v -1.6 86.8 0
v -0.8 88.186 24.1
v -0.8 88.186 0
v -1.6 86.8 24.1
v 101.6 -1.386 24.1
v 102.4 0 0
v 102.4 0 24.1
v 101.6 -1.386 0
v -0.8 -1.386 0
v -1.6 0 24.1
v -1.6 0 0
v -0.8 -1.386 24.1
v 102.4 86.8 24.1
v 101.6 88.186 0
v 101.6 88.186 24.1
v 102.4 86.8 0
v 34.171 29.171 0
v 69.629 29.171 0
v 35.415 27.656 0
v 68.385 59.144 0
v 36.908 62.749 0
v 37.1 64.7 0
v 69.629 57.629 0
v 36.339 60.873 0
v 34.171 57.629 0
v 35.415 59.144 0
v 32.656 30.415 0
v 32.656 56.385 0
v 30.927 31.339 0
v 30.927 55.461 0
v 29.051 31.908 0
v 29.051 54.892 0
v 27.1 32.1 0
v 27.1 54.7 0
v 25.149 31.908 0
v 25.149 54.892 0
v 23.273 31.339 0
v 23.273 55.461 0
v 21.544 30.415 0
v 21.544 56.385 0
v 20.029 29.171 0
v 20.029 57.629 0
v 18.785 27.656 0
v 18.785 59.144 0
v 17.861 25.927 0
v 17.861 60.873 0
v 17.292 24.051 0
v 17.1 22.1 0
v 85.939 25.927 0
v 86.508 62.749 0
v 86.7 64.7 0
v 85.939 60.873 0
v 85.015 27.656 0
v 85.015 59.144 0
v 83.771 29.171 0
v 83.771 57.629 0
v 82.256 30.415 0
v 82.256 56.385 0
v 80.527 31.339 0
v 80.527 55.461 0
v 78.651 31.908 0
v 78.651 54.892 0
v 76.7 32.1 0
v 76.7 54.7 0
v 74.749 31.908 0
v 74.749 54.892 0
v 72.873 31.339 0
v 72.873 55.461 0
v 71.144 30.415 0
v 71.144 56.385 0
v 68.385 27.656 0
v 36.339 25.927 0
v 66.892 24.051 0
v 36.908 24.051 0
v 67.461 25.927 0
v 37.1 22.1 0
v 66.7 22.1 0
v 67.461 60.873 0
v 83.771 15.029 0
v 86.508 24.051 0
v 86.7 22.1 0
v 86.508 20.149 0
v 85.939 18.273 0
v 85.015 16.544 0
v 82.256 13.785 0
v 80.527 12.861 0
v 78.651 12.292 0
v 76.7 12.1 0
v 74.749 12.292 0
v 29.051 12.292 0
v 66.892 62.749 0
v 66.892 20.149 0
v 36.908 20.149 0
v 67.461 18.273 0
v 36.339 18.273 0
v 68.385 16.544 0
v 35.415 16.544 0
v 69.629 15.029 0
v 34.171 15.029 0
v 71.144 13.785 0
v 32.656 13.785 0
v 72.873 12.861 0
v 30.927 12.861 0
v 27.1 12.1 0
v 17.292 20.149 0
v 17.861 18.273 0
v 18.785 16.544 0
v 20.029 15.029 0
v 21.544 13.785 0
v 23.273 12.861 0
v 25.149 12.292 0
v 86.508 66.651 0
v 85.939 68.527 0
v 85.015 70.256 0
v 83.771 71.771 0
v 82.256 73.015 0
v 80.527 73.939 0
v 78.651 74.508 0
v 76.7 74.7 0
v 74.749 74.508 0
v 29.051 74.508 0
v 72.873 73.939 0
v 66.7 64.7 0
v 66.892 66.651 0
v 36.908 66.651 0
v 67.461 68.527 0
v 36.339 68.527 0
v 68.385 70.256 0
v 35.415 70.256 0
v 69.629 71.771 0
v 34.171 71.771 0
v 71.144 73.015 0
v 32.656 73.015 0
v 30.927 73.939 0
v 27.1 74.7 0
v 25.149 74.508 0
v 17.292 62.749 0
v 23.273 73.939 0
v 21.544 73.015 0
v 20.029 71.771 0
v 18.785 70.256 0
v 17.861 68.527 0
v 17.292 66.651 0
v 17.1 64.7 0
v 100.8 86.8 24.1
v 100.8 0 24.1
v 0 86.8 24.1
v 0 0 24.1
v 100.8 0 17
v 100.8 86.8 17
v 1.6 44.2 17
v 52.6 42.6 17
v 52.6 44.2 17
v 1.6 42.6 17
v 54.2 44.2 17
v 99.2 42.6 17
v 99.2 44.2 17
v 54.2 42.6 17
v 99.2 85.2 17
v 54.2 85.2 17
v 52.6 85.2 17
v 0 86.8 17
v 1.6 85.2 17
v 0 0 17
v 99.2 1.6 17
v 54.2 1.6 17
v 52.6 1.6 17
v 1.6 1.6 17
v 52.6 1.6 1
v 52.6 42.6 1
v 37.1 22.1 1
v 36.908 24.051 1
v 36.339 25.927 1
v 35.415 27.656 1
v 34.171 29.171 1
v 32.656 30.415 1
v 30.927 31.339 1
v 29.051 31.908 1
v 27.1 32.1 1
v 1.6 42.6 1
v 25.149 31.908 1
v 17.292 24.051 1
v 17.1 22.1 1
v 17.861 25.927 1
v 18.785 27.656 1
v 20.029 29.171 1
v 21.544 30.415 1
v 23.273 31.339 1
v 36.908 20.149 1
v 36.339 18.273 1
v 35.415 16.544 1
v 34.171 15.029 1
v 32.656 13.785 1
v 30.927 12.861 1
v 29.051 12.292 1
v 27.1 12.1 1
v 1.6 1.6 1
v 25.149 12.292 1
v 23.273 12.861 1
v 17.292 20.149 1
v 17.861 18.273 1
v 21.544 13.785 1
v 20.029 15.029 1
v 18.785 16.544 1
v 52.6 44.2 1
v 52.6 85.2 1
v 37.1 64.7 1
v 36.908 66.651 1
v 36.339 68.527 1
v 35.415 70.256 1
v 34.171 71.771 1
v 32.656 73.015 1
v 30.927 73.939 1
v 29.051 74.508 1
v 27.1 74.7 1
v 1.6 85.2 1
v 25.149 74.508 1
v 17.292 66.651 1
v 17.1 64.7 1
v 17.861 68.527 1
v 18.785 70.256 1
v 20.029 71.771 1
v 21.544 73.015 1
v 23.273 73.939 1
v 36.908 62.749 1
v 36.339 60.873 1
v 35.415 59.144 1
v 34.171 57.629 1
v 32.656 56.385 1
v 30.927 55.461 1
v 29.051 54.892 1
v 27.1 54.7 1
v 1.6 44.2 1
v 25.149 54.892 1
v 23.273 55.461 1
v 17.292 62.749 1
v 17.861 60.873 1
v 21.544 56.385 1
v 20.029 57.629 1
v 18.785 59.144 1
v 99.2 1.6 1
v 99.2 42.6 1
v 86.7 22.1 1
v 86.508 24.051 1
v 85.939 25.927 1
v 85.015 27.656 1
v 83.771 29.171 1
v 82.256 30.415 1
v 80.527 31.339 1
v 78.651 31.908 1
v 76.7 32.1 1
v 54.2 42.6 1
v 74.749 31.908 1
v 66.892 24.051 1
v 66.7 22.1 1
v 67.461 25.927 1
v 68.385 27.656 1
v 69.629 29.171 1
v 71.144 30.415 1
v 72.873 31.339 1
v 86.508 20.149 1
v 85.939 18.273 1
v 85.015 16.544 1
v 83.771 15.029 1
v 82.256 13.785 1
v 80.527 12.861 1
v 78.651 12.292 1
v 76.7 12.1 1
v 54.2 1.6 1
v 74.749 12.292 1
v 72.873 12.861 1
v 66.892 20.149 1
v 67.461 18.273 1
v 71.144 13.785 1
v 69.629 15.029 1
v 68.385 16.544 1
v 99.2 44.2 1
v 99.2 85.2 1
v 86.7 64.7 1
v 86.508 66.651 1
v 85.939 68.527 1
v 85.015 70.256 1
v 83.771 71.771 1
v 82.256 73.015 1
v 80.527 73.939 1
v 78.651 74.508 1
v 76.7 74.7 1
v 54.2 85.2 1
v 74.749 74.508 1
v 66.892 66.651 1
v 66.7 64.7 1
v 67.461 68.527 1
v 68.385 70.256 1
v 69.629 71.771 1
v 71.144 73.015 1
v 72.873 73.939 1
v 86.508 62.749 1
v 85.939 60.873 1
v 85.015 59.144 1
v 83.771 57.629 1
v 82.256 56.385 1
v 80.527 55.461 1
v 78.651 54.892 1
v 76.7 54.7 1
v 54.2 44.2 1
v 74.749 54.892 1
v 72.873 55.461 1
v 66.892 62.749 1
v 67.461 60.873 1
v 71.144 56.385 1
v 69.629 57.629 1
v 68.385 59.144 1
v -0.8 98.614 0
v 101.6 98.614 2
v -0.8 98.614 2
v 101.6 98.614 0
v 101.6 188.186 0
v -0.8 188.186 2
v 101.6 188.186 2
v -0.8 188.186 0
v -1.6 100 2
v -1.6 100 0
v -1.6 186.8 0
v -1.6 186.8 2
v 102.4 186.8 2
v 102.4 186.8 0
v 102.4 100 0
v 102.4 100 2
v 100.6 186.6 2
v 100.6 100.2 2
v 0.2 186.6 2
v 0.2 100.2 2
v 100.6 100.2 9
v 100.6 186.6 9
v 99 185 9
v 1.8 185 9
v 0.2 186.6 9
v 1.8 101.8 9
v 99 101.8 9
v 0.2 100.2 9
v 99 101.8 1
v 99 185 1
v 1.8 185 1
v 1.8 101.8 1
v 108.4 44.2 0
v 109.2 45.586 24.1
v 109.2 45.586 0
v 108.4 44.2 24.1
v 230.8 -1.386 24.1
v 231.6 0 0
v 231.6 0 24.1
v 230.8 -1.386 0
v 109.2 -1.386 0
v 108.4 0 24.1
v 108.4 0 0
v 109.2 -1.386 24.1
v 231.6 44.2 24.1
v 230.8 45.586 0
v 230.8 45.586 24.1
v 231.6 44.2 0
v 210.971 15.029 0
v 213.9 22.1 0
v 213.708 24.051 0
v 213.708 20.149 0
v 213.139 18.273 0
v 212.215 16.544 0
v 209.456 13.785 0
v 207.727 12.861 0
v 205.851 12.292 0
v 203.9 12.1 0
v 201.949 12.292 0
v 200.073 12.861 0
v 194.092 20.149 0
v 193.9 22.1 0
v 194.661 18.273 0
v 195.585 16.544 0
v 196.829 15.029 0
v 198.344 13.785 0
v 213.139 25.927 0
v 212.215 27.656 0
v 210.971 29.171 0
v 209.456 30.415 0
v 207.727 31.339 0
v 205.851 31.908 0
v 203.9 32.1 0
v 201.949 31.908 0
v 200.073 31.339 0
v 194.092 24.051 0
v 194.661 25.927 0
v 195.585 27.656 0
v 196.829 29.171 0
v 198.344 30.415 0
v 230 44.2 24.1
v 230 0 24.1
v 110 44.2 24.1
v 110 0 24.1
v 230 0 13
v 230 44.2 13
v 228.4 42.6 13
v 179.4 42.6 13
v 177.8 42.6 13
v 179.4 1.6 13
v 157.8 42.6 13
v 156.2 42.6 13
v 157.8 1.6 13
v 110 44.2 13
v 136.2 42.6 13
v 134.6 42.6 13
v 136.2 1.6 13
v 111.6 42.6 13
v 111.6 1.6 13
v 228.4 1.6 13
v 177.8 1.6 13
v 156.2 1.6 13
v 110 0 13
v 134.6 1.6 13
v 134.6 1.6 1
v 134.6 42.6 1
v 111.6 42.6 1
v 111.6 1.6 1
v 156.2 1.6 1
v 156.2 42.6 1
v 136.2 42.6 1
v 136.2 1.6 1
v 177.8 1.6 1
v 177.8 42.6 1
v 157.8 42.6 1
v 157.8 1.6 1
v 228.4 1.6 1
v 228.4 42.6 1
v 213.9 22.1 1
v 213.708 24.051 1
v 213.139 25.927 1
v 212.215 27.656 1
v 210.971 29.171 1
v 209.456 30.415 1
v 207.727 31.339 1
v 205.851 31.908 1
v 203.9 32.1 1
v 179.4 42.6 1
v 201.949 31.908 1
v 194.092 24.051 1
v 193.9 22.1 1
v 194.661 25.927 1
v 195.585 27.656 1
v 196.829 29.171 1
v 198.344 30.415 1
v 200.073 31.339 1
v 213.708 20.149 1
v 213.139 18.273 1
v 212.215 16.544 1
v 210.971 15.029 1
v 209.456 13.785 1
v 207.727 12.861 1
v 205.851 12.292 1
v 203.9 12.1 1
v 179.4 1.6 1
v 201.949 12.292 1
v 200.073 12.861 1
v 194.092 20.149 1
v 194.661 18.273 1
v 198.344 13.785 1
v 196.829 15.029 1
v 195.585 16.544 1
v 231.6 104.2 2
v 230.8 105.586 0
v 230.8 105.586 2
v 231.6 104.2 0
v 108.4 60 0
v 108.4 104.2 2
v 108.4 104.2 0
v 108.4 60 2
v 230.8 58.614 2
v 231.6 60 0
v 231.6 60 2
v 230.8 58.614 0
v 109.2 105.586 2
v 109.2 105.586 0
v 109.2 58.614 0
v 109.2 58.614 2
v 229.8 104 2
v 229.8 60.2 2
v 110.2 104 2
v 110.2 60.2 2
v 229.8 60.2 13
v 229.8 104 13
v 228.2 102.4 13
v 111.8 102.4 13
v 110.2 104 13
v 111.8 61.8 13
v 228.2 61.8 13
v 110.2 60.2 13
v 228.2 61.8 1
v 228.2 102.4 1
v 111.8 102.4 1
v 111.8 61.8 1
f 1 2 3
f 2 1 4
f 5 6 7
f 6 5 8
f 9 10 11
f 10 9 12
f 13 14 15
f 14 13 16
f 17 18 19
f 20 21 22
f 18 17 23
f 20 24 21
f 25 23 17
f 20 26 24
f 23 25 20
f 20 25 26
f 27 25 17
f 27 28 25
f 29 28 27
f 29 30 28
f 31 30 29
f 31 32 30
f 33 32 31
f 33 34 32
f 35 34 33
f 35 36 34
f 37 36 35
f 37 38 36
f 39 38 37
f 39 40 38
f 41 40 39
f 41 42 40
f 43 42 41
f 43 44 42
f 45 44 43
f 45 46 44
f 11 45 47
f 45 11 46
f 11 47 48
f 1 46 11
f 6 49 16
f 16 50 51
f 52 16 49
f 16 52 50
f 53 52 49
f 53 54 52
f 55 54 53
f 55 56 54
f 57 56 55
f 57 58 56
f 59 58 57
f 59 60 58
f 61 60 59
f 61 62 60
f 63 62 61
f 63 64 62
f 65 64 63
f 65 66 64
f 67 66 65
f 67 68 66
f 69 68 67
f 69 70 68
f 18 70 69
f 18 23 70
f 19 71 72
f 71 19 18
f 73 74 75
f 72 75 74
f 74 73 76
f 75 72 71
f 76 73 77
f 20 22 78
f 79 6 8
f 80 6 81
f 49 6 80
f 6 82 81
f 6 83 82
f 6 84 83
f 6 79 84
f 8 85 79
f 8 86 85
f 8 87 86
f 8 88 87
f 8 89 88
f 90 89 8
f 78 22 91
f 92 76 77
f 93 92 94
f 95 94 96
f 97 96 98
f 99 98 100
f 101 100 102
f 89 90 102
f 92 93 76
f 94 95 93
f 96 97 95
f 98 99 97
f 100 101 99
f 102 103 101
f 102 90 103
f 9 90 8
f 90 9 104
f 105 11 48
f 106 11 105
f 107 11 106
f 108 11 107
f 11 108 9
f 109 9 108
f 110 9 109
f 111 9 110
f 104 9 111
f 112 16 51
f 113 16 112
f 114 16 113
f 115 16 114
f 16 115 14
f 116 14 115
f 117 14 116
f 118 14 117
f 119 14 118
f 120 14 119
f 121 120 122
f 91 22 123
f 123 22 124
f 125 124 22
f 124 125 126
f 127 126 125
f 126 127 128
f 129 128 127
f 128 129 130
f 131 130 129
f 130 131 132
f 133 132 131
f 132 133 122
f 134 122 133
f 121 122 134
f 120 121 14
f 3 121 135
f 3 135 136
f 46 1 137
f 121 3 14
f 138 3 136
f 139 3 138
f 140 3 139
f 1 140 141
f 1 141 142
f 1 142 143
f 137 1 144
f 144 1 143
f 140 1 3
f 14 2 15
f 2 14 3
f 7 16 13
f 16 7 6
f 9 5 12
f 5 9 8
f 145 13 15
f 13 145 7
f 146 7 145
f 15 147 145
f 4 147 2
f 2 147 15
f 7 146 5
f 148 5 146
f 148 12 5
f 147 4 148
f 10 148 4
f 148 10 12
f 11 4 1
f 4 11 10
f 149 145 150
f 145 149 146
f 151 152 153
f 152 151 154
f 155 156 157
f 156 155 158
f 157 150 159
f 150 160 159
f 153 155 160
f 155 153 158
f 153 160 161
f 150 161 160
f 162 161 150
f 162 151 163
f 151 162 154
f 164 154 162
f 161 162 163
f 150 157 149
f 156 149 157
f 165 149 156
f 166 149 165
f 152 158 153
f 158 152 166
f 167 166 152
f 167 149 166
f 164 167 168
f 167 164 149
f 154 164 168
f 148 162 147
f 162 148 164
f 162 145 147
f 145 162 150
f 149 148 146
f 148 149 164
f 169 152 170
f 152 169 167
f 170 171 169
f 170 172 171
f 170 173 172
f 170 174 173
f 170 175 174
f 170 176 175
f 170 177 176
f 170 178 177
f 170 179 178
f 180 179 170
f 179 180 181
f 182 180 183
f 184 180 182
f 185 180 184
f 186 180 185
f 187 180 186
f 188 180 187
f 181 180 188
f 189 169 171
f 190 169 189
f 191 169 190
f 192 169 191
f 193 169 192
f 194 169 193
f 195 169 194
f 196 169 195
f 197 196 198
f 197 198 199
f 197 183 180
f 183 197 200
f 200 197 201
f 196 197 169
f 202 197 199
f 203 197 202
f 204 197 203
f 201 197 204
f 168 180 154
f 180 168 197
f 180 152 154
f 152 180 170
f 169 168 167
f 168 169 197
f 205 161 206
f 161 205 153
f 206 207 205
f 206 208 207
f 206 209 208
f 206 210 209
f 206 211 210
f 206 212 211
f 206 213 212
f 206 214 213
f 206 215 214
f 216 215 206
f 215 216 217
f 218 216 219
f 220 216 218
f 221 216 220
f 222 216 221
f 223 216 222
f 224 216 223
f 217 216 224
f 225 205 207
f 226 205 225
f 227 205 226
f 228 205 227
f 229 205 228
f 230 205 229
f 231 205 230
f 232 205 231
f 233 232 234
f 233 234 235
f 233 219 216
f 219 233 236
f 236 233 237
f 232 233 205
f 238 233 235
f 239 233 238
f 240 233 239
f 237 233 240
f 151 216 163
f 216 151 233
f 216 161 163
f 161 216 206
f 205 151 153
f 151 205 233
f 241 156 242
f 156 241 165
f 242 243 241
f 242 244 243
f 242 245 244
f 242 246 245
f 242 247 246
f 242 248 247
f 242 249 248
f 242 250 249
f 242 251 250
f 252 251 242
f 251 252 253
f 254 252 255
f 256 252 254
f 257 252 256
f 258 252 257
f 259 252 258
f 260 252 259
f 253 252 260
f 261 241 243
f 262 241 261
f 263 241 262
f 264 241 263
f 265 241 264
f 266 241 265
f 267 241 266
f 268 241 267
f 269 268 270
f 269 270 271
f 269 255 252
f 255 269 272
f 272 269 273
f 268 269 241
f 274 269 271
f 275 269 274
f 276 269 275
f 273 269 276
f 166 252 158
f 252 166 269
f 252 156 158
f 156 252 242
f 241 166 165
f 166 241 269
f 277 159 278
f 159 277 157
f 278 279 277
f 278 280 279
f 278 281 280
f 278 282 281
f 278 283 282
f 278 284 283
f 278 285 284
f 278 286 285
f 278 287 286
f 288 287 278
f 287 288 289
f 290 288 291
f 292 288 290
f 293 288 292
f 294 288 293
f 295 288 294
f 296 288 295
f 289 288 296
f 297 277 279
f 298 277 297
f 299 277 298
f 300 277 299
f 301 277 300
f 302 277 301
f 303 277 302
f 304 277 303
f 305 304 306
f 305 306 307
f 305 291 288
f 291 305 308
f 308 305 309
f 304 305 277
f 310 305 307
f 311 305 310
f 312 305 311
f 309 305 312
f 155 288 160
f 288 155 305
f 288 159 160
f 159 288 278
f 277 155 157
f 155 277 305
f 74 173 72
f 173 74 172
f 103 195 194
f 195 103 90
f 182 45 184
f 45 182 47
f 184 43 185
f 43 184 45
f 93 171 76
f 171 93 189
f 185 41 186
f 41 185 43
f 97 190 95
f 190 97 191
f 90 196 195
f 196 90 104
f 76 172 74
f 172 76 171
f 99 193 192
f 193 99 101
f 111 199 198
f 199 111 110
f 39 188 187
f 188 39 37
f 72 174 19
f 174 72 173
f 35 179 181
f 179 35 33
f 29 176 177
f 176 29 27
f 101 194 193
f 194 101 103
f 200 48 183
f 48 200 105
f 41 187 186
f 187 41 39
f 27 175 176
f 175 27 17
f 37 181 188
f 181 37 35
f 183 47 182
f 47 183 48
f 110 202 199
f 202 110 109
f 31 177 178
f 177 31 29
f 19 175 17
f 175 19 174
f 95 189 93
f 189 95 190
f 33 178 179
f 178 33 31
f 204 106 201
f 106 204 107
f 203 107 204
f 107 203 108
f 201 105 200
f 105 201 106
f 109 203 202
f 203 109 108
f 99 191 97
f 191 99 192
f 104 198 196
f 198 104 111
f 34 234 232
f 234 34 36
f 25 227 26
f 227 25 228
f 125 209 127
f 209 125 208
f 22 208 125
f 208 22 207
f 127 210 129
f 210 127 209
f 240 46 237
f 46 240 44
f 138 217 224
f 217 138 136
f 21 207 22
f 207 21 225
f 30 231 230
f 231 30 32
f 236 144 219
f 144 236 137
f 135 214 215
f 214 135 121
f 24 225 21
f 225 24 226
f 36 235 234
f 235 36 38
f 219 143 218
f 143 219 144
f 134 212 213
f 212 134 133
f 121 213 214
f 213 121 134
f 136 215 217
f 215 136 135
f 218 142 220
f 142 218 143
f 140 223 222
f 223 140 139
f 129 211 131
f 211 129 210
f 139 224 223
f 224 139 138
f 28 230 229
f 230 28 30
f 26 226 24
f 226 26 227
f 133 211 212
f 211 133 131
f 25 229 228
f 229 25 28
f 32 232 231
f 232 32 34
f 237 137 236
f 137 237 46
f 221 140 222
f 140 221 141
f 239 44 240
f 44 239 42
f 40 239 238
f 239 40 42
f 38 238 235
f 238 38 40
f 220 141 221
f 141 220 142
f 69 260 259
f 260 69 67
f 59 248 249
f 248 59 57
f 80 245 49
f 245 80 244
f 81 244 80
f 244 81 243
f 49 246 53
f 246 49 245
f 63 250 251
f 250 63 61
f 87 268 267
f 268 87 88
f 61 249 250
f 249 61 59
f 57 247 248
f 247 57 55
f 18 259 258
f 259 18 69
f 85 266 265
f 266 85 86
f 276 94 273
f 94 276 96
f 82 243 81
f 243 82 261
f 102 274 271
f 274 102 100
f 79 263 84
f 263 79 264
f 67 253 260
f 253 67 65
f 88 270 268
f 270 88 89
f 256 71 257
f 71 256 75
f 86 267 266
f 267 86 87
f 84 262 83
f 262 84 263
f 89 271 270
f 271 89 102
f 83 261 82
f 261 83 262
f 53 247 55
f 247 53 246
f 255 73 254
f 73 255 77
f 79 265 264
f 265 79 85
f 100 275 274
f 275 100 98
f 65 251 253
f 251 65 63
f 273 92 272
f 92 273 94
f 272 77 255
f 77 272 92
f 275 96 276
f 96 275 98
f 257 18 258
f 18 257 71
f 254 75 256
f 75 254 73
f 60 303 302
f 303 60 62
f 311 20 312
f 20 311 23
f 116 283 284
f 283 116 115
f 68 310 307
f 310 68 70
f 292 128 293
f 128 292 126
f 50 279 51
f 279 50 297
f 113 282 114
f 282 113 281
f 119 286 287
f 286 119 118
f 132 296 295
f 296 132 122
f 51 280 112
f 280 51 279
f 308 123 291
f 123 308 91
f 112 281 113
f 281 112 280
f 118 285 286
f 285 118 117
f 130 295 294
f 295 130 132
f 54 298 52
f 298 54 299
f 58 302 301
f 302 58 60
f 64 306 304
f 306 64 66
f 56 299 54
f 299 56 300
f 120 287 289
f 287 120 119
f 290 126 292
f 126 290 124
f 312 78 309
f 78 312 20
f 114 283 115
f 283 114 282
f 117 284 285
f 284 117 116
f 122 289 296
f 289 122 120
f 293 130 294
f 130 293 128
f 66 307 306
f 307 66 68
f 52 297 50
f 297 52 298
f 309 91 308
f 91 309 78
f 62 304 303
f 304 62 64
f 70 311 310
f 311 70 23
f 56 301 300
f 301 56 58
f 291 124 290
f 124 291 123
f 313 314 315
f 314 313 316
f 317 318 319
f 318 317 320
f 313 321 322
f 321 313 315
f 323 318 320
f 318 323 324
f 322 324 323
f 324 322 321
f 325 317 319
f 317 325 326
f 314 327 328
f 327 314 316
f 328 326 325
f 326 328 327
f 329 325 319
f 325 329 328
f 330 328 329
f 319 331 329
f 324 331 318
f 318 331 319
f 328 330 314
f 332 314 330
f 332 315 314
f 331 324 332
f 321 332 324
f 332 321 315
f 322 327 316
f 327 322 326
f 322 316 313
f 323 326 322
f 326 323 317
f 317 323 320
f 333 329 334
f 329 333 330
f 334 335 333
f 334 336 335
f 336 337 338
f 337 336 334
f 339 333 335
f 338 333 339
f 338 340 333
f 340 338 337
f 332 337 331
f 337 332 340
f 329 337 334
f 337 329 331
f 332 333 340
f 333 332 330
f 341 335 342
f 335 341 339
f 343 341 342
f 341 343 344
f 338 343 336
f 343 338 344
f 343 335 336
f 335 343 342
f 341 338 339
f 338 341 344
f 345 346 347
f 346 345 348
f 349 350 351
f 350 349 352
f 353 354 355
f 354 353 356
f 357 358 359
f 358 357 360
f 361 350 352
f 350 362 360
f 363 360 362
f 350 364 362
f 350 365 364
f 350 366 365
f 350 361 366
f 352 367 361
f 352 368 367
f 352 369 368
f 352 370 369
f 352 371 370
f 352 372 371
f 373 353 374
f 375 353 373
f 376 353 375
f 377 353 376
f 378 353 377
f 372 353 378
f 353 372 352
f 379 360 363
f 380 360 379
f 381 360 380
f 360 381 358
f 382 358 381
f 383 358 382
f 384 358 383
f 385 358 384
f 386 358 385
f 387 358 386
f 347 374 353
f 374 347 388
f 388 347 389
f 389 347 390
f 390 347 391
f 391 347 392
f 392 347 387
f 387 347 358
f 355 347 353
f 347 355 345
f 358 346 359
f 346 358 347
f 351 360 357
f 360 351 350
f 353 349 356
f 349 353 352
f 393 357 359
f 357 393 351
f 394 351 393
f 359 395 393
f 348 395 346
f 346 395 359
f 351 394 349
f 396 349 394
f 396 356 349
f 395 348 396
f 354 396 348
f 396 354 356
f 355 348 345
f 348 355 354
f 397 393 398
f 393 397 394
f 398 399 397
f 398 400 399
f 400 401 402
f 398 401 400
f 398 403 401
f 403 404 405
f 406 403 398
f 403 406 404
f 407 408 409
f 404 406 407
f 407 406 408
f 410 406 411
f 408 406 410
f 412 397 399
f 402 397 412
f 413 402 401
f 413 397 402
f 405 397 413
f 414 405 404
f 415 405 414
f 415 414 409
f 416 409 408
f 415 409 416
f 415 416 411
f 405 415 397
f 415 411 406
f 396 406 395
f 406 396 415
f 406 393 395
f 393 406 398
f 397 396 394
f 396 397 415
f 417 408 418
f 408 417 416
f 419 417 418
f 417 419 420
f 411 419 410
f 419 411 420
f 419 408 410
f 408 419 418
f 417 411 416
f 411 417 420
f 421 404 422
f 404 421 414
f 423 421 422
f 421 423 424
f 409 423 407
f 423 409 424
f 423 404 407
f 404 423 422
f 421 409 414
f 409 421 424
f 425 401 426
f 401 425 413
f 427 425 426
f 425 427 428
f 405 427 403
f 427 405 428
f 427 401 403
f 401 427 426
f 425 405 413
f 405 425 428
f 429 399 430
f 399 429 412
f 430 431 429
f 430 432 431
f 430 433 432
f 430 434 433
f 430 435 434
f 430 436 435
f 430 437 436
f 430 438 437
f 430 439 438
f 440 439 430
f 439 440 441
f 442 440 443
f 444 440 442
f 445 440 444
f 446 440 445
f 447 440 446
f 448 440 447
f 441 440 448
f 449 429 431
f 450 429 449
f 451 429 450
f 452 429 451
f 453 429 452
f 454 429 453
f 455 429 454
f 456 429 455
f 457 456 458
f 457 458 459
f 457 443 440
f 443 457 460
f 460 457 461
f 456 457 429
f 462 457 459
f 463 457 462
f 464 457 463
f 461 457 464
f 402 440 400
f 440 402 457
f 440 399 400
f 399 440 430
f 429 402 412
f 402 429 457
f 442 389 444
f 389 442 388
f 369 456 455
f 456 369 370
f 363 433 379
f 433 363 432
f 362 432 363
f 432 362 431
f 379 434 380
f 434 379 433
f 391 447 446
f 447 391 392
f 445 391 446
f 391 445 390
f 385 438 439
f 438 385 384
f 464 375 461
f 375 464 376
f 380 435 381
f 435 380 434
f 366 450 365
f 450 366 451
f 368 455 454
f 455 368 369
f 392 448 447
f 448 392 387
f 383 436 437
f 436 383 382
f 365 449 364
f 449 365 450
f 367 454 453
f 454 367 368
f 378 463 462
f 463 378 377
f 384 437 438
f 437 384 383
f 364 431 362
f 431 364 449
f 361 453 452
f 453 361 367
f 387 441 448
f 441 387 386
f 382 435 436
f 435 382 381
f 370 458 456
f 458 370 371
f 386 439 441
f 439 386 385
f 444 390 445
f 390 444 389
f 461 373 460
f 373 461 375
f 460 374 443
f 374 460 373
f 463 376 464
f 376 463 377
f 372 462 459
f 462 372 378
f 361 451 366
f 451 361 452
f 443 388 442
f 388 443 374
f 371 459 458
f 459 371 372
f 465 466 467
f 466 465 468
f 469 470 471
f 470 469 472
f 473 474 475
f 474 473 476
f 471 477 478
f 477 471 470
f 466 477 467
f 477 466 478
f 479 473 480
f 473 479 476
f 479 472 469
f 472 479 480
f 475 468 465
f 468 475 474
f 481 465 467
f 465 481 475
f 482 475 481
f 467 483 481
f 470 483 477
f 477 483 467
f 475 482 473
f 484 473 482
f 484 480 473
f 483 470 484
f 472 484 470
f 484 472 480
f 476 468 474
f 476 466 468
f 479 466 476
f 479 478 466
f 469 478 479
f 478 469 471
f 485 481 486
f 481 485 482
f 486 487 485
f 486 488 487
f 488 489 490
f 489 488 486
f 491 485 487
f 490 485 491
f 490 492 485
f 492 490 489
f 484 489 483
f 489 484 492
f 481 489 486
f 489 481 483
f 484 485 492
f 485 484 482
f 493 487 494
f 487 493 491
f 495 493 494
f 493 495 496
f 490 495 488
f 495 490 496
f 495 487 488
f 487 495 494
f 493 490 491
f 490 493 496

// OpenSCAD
// Puerto Rico Anniversary Edition
//
// by W. Craig Trader is dual-licensed under 
// Creative Commons Attribution-ShareAlike 3.0 Unported License and
// GNU Lesser GPL 3.0 or later.

include <MCAD/units.scad>;

// Command Line Arguments
PART = "other";           // Which part to output
VERBOSE = 1;        // Set to non-zero to see more data

// Physical dimensions
WALL = 0.8 * mm; // Slicing filament thickness
GAP  = 0.2 * mm; // Size differential between box and lid, for snug fit
POKE_HOLE = 20 * mm; // Diameter of poke holes in bottom
BOTTOM = 1 * mm;

// Tile dimensions
BASIC_THICKNESS = 7/128 * inch;
DELUXE_THICKNESS = 1/8 * inch;
TILE_WIDTH = (1 + 37/64) * inch;
SMALL_TILE_HEIGHT = 29/32 * inch;
LARGE_TILE_HEIGHT = (1 + 57/64) * inch;

// Wall dimensions
OUTER  = 2 * WALL;
INNER  = 2 * WALL;
SEP    = 2 * WALL;

OVERLAP = 0.1 * mm; // Ensures that there are no vertical artifacts leftover

$fa=4;

module basic_bottom() {
    box_height = ceil( max( SMALL_TILE_HEIGHT/2, 5*BASIC_THICKNESS) );
    lid_height = ceil( SMALL_TILE_HEIGHT ) - box_height;

    s1 = ceil( 16*BASIC_THICKNESS );
    s2 = ceil( 14*BASIC_THICKNESS );
    s3 = ceil( 14*BASIC_THICKNESS );
    s4 = ceil( LARGE_TILE_HEIGHT );

    width = ceil( TILE_WIDTH );
    length = 2*INNER + 3*SEP + s1 + s2 + s3 + s4;
    height = 2*INNER + width;

    echo( Width=width, BasicS1=s1, BasicS2=s2, BasicS3=s3, BasicS4=s4 );
    echo( BasicInsideLength=length, BasicInsideHeight=height );
    echo( BasicOutsideLength=length+2*OUTER, BasicOutsideHeight=height+2*OUTER );

    difference() {
        // Outside of box
        minkowski() {
            cube( [ length, height, box_height+lid_height ] );
            cylinder( r=OUTER, h=OVERLAP );
        }
        
        // Remove upper lip
        translate( [ 0, 0, BOTTOM+box_height ] ) 
            cube( [ length, height, lid_height+OVERLAP ] );
        
        // Remove space for tiles
        translate( [ INNER, INNER, BOTTOM ] ) 
            cube( [ s1, width, box_height+OVERLAP ] );
        translate( [ INNER+s1+SEP, INNER, BOTTOM ] ) 
            cube( [ s2, width, box_height+OVERLAP ] );
        translate( [ INNER+s1+s2+2*SEP, INNER, BOTTOM ] ) 
            cube( [ s3, width, box_height+OVERLAP ] );
        translate( [ INNER+s1+s2+s3+3*SEP, INNER, BOTTOM ] ) 
            cube( [ s4, width, box_height+OVERLAP ] );

        // Remove holes in bottom, for ease in removing tiles and parts
        translate( [ INNER+s1+s2+s3+3*SEP+s4/2, INNER+width/2, -OVERLAP ] ) 
            cylinder( d=POKE_HOLE, h=BOTTOM+2*OVERLAP );
    }
}

module basic_top() {
    box_height = ceil( max( SMALL_TILE_HEIGHT/2, 5*BASIC_THICKNESS) );
    lid_height = ceil( SMALL_TILE_HEIGHT ) - box_height;

    s1 = ceil( 16*BASIC_THICKNESS );
    s2 = ceil( 14*BASIC_THICKNESS );
    s3 = ceil( 14*BASIC_THICKNESS );
    s4 = ceil( LARGE_TILE_HEIGHT );

    width = ceil( TILE_WIDTH );
    length = 2*INNER + 3*SEP + s1 + s2 + s3 + s4;
    height = 2*INNER + width;

    difference() {
        union() {
            minkowski() {
                cube( [ length, height, BOTTOM ] );
                cylinder( r=OUTER, h=BOTTOM );
            }
            translate( [ GAP, GAP, BOTTOM ] ) 
                cube( [ length-2*GAP, height-2*GAP, lid_height ] );
        }
        translate( [ INNER+GAP, INNER+GAP, BOTTOM ] ) 
            cube( [ length-2*INNER-2*GAP, height-2*INNER-2*GAP, lid_height+OVERLAP ] );
    }
}

module deluxe_bottom() {
    box_height = ceil( max( SMALL_TILE_HEIGHT/2, 5*DELUXE_THICKNESS) );
    lid_height = ceil( SMALL_TILE_HEIGHT ) - box_height;

    large = ceil( max( LARGE_TILE_HEIGHT, 16*DELUXE_THICKNESS ) );
    small = ceil( 14*DELUXE_THICKNESS );
    width = ceil( TILE_WIDTH );

    length = 2*INNER + large + SEP + small;
    height = 2*INNER + 2*width + SEP;

    echo( Width=width, DeluxeLarge=large, DeluxeSmall=small );
    echo( DeluxeInsideLength=length, DeluxeInsideHeight=height );
    echo( DeluxeOutsideLength=length+2*OUTER, DeluxeOutsideHeight=height+2*OUTER );

    difference() {
        // Outside of box
        minkowski() {
            cube( [ length, height, box_height+lid_height ] );
            cylinder( r=OUTER, h=OVERLAP );
        }
        
        // Remove upper lip
        translate( [ 0, 0, BOTTOM+box_height ] ) 
            cube( [ length, height, lid_height+OVERLAP ] );
        
        // Remove space for tiles
        translate( [ INNER, INNER, BOTTOM ] ) 
            cube( [ large, width, box_height+OVERLAP ] );
        translate( [ INNER, INNER+width+SEP, BOTTOM ] ) 
            cube( [ large, width, box_height+OVERLAP ] );
        translate( [ INNER+large+SEP, INNER, BOTTOM ] ) 
            cube( [ small, width, box_height+OVERLAP ] );
        translate( [ INNER+large+SEP, INNER+width+SEP, BOTTOM ] ) 
            cube( [ small, width, box_height+OVERLAP ] );
        
        // Remove holes in bottom, for ease in removing tiles and parts
        translate( [ INNER+large/2, INNER+width/2, -OVERLAP ] ) 
            cylinder( d=POKE_HOLE, h=BOTTOM+2*OVERLAP );
        translate( [ INNER+large/2, INNER+width+SEP+width/2, -OVERLAP ] ) 
            cylinder( d=POKE_HOLE, h=BOTTOM+2*OVERLAP );
        translate( [ INNER+large+SEP+small/2, INNER+width/2, -OVERLAP ] ) 
            cylinder( d=POKE_HOLE, h=BOTTOM+2*OVERLAP );
        translate( [ INNER+large+SEP+small/2, INNER+width+SEP+width/2, -OVERLAP ] ) 
            cylinder( d=POKE_HOLE, h=BOTTOM+2*OVERLAP );
    }
}

module deluxe_top() {
    box_height = ceil( max( SMALL_TILE_HEIGHT/2, 5*DELUXE_THICKNESS) );
    lid_height = ceil( SMALL_TILE_HEIGHT ) - box_height;

    large = ceil( max( LARGE_TILE_HEIGHT, 16*DELUXE_THICKNESS ) );
    small = ceil( 14*DELUXE_THICKNESS );
    width = ceil( TILE_WIDTH );

    length = 2*INNER + large + SEP + small;
    height = 2*INNER + 2*width + SEP;

    difference() {
        union() {
            minkowski() {
                cube( [ length, height, BOTTOM ] );
                cylinder( r=OUTER, h=BOTTOM );
            }
            translate( [ GAP, GAP, BOTTOM ] ) 
                cube( [ length-2*GAP, height-2*GAP, lid_height ] );
        }
        translate( [ INNER+GAP, INNER+GAP, BOTTOM ] ) 
            cube( [ length-2*INNER-2*GAP, height-2*INNER-2*GAP, lid_height+OVERLAP ] );
    }
}

if (VERBOSE) {
	echo (Part=PART);
    echo( DELUXE_THICKNESS=DELUXE_THICKNESS, BASIC_THICKNESS=BASIC_THICKNESS );
    echo( TILE_WIDTH=TILE_WIDTH, SMALL_TILE_HEIGHT=SMALL_TILE_HEIGHT, LARGE_TILE_HEIGHT=LARGE_TILE_HEIGHT );
    echo( LARGE=16*DELUXE_THICKNESS, SMALL=14*DELUXE_THICKNESS, WIDTH=TILE_WIDTH );
    echo( 5*DELUXE_THICKNESS, SMALL_TILE_HEIGHT-5*DELUXE_THICKNESS );
}

if (PART == "limited-box") {
    deluxe_bottom();
} else if (PART == "limited-lid") {
    deluxe_top();
} else if (PART == "basic-box") {
    basic_bottom();
} else if (PART == "basic-lid") {
    basic_top();
} else {
    translate( [   0,   0, 0 ] ) deluxe_bottom();
    translate( [   0, 100, 0 ] ) deluxe_top();
    translate( [ 110,   0, 0 ] ) basic_bottom();
    translate( [ 110,  60, 0 ] ) basic_top();
}
